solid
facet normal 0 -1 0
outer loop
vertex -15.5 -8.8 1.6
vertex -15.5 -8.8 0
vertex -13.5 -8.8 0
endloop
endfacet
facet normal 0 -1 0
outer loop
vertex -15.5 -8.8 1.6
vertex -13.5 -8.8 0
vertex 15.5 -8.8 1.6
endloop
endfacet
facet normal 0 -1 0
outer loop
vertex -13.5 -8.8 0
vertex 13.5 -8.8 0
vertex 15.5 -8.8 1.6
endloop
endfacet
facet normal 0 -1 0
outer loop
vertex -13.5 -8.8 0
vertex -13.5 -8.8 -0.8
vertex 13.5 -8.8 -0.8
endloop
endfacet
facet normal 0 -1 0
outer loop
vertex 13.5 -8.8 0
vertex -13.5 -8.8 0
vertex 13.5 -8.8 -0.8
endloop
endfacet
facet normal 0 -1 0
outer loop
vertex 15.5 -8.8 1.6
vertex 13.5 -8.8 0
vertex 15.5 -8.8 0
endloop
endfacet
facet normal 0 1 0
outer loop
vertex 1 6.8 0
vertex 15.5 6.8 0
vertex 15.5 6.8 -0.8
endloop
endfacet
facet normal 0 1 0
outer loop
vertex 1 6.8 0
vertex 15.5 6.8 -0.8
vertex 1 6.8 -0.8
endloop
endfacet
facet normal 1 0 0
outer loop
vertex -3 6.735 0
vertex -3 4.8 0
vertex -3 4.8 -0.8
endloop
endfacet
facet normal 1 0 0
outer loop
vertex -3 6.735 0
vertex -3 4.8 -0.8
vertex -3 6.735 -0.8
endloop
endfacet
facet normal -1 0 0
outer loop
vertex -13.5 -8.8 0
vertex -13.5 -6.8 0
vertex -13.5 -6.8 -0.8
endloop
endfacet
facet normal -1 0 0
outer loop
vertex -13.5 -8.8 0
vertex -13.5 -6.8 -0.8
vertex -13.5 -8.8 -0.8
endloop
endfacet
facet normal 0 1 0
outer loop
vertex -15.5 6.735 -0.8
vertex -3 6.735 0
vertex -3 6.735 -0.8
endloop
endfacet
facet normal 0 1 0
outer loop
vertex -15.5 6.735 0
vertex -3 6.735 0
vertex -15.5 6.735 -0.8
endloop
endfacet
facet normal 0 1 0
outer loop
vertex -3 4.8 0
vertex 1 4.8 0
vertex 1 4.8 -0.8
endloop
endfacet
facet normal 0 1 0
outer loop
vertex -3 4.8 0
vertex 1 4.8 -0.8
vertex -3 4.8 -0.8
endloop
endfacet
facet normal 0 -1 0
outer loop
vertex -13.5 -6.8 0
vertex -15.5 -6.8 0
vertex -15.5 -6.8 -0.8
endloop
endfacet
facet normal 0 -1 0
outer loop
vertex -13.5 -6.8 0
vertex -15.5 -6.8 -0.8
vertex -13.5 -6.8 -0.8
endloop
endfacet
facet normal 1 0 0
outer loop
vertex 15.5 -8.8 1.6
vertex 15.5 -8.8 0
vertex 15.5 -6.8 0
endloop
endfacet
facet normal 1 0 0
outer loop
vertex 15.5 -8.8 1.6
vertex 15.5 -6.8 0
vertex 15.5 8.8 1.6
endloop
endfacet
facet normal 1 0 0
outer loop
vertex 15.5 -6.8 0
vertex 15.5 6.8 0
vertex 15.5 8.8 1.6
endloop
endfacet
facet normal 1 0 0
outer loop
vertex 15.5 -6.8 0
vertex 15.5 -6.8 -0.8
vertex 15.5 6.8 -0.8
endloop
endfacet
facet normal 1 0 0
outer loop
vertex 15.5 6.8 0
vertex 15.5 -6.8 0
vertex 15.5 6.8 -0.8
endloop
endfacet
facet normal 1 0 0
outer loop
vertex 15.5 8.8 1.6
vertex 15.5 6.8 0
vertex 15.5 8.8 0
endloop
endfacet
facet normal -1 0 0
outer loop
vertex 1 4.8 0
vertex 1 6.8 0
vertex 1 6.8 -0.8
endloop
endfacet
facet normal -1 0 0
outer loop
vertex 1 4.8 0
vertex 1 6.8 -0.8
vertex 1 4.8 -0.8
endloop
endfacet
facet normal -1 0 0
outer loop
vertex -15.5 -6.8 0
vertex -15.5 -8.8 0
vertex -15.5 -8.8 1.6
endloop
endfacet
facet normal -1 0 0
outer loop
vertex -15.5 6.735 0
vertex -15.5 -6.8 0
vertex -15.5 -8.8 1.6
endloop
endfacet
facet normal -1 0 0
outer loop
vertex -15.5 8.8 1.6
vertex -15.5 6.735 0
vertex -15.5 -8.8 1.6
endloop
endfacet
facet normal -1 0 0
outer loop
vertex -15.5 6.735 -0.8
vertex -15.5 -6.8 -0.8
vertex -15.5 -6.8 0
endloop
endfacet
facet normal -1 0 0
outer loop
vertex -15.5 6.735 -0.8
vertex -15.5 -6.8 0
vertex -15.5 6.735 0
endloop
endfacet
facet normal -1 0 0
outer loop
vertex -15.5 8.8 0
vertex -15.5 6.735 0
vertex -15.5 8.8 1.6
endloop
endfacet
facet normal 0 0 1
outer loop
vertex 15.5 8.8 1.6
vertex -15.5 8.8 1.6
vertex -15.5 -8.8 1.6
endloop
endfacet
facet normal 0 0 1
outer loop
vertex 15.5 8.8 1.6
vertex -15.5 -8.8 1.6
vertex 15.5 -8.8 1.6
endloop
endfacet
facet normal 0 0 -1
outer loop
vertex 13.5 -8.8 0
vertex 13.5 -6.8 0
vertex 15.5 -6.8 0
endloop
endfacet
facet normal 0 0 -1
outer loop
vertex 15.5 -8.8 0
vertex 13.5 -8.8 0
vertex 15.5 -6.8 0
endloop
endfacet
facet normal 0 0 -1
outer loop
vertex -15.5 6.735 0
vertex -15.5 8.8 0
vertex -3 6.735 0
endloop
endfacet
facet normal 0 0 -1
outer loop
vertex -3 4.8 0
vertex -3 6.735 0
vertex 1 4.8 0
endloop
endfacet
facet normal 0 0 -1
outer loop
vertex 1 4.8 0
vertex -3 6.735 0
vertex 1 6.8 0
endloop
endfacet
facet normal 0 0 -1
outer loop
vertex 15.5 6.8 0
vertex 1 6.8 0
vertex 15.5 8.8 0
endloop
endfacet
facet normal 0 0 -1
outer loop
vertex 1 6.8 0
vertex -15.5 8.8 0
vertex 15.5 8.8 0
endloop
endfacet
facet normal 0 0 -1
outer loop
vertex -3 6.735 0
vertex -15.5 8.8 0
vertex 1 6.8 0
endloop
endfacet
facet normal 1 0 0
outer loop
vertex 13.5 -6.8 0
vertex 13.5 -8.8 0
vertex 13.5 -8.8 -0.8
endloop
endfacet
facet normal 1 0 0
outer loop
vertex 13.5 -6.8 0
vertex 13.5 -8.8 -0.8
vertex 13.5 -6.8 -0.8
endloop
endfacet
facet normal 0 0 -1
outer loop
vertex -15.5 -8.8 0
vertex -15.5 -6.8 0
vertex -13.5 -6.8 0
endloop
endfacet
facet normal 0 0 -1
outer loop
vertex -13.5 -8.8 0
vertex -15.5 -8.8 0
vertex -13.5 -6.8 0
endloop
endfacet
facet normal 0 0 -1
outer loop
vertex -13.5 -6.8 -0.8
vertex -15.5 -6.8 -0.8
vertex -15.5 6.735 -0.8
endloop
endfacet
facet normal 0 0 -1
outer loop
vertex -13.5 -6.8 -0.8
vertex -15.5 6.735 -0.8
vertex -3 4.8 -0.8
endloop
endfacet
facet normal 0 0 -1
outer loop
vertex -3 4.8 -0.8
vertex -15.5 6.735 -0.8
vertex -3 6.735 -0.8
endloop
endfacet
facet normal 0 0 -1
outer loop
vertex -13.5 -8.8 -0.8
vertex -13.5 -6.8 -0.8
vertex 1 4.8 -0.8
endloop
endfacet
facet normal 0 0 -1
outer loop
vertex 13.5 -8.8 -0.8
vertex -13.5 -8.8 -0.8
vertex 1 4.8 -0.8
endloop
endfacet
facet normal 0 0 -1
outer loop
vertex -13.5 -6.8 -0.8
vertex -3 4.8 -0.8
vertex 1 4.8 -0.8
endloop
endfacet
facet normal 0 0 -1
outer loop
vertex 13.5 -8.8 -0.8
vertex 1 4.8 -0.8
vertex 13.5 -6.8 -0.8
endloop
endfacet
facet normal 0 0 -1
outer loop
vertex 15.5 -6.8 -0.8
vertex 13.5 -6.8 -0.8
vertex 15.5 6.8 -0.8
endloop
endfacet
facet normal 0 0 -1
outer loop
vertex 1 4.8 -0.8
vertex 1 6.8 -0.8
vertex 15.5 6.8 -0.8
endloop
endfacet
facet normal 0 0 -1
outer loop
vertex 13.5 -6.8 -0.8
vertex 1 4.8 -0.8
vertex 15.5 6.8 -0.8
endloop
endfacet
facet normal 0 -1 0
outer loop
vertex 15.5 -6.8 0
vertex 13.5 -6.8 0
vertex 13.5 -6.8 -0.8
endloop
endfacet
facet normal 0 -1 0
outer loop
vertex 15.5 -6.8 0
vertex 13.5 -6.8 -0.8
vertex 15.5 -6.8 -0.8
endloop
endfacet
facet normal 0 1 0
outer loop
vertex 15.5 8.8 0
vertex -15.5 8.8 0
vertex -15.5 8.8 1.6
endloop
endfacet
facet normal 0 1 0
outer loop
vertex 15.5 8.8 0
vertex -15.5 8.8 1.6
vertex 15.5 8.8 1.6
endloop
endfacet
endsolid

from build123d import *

# Parameters (mm, degrees)
SKETCH_1_W      = 31
SKETCH_1_H      = 17.6
EXTRUDE_1_DEPTH = 1.6
EXTRUDE_2_DEPTH = 0.8


with BuildPart() as part:
    # 草图1 → 凸台-拉伸1 (new body)
    with BuildSketch(Plane.XY):
        Rectangle(SKETCH_1_W, SKETCH_1_H)
    extrude(amount=EXTRUDE_1_DEPTH)

    # 草图2 → 凸台-拉伸2 (add)
    with BuildSketch(Plane(origin=(0, 0, 0), x_dir=(-1, 0, 0), z_dir=(0, 0, -1))):
        Polygon((-13.5, -8.8), (-13.5, -6.8), (-15.5, -6.8), (-15.5, 6.8), (-1, 6.8), (-1, 4.8), (3, 4.8), (3, 6.735183862), (15.5, 6.735183862), (15.5, -6.8), (13.5, -6.8), (13.5, -8.8), align=None)
    extrude(amount=EXTRUDE_2_DEPTH)


solid = part.part
